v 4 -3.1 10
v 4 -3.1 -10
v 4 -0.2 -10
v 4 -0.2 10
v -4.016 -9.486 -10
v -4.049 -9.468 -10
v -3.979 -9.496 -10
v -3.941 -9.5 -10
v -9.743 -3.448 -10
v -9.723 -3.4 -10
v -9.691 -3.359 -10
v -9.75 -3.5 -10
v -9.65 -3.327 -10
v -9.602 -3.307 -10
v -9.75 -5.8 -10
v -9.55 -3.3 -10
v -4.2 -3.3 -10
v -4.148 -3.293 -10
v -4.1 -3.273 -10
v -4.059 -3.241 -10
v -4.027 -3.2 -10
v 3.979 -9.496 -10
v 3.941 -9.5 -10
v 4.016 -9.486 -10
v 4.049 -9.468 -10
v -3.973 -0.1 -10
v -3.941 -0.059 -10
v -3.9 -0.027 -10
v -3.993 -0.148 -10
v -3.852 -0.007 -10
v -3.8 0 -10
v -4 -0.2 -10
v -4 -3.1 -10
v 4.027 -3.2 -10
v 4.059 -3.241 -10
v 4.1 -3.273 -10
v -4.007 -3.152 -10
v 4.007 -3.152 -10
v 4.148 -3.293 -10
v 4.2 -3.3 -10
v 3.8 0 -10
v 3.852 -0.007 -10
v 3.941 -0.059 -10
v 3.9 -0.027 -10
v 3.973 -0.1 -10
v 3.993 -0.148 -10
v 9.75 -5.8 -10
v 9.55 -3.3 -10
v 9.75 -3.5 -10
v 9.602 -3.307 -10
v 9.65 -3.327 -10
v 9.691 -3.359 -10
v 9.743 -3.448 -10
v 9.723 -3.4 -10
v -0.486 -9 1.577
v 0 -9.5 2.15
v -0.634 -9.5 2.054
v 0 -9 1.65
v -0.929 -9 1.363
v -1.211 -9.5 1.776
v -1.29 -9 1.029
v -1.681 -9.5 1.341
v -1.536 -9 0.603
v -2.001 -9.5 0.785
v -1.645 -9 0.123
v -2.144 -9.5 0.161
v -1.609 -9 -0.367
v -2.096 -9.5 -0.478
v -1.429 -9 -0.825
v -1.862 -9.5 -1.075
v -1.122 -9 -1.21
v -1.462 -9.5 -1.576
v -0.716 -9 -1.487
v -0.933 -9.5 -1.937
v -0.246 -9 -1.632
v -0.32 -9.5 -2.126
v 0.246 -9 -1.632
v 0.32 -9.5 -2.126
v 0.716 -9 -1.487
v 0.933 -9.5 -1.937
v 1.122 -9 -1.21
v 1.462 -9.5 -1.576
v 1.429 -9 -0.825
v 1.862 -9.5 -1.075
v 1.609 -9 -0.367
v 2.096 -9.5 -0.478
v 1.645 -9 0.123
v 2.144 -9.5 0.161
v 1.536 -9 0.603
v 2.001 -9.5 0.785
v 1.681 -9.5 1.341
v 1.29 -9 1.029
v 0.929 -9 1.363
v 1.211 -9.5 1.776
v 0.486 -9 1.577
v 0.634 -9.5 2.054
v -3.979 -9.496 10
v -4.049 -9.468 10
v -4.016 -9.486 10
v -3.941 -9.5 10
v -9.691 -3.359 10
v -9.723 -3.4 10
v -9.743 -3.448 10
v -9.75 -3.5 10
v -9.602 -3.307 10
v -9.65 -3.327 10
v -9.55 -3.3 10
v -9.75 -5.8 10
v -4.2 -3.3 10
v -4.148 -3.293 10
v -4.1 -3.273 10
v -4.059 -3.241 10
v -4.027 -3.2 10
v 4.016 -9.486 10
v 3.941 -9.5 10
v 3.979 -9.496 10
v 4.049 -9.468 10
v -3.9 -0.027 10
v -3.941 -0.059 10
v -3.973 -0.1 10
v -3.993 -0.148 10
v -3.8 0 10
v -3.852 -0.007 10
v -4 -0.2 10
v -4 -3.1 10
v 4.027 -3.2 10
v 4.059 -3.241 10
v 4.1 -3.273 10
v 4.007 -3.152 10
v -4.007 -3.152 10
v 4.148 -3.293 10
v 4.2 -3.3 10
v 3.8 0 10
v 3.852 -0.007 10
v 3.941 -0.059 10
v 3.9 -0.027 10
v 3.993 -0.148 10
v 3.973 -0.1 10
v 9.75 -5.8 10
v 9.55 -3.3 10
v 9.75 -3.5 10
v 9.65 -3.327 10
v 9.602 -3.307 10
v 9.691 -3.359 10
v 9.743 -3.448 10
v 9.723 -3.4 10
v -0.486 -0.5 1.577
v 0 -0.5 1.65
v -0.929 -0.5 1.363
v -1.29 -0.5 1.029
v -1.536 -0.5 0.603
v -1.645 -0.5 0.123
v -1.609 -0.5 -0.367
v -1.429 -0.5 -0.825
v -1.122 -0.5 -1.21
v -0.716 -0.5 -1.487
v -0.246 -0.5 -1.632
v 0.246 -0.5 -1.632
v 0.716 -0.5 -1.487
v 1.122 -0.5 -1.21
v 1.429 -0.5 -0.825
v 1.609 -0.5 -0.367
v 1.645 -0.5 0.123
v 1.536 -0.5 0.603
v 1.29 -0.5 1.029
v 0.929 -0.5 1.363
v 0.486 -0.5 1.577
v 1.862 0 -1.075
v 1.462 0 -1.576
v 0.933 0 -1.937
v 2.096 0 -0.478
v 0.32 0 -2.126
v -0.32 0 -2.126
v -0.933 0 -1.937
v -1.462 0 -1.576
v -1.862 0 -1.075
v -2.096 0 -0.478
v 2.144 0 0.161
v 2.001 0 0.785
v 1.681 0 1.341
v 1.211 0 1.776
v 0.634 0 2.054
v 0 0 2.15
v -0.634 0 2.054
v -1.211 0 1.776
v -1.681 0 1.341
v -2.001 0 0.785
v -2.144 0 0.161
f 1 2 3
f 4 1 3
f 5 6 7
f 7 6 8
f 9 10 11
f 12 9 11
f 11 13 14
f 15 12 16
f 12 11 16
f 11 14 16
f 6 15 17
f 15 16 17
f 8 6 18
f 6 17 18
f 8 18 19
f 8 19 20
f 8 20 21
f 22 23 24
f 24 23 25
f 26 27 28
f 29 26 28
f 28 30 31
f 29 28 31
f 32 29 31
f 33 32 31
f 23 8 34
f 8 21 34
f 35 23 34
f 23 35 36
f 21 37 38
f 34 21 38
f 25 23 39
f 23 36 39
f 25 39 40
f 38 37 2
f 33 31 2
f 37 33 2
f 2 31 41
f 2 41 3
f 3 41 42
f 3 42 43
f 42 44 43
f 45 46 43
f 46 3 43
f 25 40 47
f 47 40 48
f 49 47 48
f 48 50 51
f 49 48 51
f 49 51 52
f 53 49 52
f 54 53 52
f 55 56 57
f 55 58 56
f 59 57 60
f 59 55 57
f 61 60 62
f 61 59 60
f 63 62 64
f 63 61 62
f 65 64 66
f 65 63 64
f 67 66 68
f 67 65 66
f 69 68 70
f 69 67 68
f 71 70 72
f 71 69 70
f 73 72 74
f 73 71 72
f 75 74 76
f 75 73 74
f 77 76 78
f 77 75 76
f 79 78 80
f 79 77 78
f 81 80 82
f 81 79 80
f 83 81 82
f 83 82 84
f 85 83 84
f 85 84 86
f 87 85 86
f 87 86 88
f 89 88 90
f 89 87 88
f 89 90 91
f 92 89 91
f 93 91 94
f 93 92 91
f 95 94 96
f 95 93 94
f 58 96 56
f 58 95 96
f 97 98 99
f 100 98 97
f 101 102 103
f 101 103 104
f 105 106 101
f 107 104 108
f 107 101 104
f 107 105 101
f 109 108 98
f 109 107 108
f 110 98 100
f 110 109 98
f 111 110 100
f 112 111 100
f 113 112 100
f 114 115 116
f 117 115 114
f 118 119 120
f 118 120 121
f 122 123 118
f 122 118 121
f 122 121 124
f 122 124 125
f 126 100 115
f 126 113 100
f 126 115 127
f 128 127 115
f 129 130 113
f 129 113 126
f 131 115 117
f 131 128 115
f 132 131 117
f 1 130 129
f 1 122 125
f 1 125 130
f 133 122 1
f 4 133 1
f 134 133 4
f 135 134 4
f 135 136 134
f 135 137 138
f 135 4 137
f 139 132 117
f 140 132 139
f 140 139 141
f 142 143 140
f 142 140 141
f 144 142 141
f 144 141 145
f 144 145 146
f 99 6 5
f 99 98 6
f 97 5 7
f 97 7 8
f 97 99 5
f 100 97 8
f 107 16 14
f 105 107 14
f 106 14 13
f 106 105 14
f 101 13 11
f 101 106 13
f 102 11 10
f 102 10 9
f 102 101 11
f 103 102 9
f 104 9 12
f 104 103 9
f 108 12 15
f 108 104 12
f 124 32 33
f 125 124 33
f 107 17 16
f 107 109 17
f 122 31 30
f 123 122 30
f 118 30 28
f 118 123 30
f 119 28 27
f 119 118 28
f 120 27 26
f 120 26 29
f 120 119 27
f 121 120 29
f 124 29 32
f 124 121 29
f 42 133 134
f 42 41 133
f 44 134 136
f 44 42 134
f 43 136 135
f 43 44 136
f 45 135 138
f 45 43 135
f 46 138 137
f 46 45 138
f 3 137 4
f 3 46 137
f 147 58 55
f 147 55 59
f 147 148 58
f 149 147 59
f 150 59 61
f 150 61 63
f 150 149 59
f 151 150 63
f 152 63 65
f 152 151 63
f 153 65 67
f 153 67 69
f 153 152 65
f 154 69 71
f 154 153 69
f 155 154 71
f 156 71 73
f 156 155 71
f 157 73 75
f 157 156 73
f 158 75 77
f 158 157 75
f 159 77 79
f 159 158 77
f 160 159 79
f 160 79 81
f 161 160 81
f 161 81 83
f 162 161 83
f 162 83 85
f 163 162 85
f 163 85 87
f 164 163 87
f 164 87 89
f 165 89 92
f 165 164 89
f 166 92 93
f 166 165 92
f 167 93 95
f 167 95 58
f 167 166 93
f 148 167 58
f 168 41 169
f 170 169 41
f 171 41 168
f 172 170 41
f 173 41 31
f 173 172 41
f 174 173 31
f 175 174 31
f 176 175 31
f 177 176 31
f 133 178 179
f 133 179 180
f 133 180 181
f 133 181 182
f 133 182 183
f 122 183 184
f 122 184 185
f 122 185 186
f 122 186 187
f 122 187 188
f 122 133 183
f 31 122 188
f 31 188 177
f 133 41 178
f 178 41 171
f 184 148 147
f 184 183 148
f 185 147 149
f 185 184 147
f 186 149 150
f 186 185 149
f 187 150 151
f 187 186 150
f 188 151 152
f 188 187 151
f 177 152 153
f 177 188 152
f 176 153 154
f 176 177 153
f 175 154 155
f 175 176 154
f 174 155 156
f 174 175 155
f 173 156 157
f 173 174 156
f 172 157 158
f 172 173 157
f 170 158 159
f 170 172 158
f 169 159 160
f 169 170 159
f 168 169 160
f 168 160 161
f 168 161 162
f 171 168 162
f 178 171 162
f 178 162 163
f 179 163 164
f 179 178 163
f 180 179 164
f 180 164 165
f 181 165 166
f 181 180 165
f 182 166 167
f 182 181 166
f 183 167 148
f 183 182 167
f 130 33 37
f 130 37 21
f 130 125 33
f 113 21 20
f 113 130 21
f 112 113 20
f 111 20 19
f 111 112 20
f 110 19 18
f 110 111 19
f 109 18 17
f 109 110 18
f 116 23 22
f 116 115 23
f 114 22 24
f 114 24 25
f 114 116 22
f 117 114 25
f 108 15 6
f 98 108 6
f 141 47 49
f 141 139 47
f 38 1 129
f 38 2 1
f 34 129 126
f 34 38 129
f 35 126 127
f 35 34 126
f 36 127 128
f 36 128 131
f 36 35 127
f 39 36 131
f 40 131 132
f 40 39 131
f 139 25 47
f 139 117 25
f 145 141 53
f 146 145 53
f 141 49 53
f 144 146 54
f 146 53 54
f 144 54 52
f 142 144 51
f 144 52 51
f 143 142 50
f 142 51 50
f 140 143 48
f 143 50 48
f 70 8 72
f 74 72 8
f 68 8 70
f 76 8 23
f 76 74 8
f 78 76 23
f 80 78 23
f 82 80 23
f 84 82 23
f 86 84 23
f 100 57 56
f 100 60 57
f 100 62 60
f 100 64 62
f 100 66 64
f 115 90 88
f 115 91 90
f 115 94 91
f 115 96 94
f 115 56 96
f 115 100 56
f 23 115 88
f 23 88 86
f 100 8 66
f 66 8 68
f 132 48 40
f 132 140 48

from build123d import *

# Parameters (mm, degrees)
EXTRUDE_1_DEPTH = 10
FILLET_1_R      = 0.2


with BuildPart() as part:
    # Эскиз1 → Бобышка-Вытянуть1 (new body, symmetric)
    with BuildSketch(Plane.XY):
        Polygon((4, 0), (-4, 0), (-4, -3.3), (-9.75, -3.3), (-9.75, -5.8), (-4, -9.5), (4, -9.5), (9.75, -5.8), (9.75, -3.3), (4, -3.3), align=None)
    extrude(amount=EXTRUDE_1_DEPTH, both=True)

    # Эскиз4 → Отверстие обработанное метчиком M43 (revolve, cut)
    with BuildSketch(Plane(origin=(0, 0, 0), x_dir=(0, 0, 1), z_dir=(1, 0, 0))):
        Polygon((0, 0), (0, 9.5), (2.15, 9.5), (1.65, 9), (1.65, 0.5), (2.15, 0), align=None)
    revolve(axis=Axis((0, 6.35, 0), (0, -1, 0)), mode=Mode.SUBTRACT)

    # Скругление1
    fillet_1_edges = [part.edges().sort_by_distance(p)[0] for p in [
        (-4, 0, 0),
        (4, 0, 0),
        (4, -3.3, 0),
        (9.75, -3.3, 0),
        (4, -9.5, 0),
        (-4, -9.5, 0),
        (-9.75, -3.3, 0),
        (-4, -3.3, 0),
    ]]
    fillet(fillet_1_edges, radius=FILLET_1_R)


solid = part.part
